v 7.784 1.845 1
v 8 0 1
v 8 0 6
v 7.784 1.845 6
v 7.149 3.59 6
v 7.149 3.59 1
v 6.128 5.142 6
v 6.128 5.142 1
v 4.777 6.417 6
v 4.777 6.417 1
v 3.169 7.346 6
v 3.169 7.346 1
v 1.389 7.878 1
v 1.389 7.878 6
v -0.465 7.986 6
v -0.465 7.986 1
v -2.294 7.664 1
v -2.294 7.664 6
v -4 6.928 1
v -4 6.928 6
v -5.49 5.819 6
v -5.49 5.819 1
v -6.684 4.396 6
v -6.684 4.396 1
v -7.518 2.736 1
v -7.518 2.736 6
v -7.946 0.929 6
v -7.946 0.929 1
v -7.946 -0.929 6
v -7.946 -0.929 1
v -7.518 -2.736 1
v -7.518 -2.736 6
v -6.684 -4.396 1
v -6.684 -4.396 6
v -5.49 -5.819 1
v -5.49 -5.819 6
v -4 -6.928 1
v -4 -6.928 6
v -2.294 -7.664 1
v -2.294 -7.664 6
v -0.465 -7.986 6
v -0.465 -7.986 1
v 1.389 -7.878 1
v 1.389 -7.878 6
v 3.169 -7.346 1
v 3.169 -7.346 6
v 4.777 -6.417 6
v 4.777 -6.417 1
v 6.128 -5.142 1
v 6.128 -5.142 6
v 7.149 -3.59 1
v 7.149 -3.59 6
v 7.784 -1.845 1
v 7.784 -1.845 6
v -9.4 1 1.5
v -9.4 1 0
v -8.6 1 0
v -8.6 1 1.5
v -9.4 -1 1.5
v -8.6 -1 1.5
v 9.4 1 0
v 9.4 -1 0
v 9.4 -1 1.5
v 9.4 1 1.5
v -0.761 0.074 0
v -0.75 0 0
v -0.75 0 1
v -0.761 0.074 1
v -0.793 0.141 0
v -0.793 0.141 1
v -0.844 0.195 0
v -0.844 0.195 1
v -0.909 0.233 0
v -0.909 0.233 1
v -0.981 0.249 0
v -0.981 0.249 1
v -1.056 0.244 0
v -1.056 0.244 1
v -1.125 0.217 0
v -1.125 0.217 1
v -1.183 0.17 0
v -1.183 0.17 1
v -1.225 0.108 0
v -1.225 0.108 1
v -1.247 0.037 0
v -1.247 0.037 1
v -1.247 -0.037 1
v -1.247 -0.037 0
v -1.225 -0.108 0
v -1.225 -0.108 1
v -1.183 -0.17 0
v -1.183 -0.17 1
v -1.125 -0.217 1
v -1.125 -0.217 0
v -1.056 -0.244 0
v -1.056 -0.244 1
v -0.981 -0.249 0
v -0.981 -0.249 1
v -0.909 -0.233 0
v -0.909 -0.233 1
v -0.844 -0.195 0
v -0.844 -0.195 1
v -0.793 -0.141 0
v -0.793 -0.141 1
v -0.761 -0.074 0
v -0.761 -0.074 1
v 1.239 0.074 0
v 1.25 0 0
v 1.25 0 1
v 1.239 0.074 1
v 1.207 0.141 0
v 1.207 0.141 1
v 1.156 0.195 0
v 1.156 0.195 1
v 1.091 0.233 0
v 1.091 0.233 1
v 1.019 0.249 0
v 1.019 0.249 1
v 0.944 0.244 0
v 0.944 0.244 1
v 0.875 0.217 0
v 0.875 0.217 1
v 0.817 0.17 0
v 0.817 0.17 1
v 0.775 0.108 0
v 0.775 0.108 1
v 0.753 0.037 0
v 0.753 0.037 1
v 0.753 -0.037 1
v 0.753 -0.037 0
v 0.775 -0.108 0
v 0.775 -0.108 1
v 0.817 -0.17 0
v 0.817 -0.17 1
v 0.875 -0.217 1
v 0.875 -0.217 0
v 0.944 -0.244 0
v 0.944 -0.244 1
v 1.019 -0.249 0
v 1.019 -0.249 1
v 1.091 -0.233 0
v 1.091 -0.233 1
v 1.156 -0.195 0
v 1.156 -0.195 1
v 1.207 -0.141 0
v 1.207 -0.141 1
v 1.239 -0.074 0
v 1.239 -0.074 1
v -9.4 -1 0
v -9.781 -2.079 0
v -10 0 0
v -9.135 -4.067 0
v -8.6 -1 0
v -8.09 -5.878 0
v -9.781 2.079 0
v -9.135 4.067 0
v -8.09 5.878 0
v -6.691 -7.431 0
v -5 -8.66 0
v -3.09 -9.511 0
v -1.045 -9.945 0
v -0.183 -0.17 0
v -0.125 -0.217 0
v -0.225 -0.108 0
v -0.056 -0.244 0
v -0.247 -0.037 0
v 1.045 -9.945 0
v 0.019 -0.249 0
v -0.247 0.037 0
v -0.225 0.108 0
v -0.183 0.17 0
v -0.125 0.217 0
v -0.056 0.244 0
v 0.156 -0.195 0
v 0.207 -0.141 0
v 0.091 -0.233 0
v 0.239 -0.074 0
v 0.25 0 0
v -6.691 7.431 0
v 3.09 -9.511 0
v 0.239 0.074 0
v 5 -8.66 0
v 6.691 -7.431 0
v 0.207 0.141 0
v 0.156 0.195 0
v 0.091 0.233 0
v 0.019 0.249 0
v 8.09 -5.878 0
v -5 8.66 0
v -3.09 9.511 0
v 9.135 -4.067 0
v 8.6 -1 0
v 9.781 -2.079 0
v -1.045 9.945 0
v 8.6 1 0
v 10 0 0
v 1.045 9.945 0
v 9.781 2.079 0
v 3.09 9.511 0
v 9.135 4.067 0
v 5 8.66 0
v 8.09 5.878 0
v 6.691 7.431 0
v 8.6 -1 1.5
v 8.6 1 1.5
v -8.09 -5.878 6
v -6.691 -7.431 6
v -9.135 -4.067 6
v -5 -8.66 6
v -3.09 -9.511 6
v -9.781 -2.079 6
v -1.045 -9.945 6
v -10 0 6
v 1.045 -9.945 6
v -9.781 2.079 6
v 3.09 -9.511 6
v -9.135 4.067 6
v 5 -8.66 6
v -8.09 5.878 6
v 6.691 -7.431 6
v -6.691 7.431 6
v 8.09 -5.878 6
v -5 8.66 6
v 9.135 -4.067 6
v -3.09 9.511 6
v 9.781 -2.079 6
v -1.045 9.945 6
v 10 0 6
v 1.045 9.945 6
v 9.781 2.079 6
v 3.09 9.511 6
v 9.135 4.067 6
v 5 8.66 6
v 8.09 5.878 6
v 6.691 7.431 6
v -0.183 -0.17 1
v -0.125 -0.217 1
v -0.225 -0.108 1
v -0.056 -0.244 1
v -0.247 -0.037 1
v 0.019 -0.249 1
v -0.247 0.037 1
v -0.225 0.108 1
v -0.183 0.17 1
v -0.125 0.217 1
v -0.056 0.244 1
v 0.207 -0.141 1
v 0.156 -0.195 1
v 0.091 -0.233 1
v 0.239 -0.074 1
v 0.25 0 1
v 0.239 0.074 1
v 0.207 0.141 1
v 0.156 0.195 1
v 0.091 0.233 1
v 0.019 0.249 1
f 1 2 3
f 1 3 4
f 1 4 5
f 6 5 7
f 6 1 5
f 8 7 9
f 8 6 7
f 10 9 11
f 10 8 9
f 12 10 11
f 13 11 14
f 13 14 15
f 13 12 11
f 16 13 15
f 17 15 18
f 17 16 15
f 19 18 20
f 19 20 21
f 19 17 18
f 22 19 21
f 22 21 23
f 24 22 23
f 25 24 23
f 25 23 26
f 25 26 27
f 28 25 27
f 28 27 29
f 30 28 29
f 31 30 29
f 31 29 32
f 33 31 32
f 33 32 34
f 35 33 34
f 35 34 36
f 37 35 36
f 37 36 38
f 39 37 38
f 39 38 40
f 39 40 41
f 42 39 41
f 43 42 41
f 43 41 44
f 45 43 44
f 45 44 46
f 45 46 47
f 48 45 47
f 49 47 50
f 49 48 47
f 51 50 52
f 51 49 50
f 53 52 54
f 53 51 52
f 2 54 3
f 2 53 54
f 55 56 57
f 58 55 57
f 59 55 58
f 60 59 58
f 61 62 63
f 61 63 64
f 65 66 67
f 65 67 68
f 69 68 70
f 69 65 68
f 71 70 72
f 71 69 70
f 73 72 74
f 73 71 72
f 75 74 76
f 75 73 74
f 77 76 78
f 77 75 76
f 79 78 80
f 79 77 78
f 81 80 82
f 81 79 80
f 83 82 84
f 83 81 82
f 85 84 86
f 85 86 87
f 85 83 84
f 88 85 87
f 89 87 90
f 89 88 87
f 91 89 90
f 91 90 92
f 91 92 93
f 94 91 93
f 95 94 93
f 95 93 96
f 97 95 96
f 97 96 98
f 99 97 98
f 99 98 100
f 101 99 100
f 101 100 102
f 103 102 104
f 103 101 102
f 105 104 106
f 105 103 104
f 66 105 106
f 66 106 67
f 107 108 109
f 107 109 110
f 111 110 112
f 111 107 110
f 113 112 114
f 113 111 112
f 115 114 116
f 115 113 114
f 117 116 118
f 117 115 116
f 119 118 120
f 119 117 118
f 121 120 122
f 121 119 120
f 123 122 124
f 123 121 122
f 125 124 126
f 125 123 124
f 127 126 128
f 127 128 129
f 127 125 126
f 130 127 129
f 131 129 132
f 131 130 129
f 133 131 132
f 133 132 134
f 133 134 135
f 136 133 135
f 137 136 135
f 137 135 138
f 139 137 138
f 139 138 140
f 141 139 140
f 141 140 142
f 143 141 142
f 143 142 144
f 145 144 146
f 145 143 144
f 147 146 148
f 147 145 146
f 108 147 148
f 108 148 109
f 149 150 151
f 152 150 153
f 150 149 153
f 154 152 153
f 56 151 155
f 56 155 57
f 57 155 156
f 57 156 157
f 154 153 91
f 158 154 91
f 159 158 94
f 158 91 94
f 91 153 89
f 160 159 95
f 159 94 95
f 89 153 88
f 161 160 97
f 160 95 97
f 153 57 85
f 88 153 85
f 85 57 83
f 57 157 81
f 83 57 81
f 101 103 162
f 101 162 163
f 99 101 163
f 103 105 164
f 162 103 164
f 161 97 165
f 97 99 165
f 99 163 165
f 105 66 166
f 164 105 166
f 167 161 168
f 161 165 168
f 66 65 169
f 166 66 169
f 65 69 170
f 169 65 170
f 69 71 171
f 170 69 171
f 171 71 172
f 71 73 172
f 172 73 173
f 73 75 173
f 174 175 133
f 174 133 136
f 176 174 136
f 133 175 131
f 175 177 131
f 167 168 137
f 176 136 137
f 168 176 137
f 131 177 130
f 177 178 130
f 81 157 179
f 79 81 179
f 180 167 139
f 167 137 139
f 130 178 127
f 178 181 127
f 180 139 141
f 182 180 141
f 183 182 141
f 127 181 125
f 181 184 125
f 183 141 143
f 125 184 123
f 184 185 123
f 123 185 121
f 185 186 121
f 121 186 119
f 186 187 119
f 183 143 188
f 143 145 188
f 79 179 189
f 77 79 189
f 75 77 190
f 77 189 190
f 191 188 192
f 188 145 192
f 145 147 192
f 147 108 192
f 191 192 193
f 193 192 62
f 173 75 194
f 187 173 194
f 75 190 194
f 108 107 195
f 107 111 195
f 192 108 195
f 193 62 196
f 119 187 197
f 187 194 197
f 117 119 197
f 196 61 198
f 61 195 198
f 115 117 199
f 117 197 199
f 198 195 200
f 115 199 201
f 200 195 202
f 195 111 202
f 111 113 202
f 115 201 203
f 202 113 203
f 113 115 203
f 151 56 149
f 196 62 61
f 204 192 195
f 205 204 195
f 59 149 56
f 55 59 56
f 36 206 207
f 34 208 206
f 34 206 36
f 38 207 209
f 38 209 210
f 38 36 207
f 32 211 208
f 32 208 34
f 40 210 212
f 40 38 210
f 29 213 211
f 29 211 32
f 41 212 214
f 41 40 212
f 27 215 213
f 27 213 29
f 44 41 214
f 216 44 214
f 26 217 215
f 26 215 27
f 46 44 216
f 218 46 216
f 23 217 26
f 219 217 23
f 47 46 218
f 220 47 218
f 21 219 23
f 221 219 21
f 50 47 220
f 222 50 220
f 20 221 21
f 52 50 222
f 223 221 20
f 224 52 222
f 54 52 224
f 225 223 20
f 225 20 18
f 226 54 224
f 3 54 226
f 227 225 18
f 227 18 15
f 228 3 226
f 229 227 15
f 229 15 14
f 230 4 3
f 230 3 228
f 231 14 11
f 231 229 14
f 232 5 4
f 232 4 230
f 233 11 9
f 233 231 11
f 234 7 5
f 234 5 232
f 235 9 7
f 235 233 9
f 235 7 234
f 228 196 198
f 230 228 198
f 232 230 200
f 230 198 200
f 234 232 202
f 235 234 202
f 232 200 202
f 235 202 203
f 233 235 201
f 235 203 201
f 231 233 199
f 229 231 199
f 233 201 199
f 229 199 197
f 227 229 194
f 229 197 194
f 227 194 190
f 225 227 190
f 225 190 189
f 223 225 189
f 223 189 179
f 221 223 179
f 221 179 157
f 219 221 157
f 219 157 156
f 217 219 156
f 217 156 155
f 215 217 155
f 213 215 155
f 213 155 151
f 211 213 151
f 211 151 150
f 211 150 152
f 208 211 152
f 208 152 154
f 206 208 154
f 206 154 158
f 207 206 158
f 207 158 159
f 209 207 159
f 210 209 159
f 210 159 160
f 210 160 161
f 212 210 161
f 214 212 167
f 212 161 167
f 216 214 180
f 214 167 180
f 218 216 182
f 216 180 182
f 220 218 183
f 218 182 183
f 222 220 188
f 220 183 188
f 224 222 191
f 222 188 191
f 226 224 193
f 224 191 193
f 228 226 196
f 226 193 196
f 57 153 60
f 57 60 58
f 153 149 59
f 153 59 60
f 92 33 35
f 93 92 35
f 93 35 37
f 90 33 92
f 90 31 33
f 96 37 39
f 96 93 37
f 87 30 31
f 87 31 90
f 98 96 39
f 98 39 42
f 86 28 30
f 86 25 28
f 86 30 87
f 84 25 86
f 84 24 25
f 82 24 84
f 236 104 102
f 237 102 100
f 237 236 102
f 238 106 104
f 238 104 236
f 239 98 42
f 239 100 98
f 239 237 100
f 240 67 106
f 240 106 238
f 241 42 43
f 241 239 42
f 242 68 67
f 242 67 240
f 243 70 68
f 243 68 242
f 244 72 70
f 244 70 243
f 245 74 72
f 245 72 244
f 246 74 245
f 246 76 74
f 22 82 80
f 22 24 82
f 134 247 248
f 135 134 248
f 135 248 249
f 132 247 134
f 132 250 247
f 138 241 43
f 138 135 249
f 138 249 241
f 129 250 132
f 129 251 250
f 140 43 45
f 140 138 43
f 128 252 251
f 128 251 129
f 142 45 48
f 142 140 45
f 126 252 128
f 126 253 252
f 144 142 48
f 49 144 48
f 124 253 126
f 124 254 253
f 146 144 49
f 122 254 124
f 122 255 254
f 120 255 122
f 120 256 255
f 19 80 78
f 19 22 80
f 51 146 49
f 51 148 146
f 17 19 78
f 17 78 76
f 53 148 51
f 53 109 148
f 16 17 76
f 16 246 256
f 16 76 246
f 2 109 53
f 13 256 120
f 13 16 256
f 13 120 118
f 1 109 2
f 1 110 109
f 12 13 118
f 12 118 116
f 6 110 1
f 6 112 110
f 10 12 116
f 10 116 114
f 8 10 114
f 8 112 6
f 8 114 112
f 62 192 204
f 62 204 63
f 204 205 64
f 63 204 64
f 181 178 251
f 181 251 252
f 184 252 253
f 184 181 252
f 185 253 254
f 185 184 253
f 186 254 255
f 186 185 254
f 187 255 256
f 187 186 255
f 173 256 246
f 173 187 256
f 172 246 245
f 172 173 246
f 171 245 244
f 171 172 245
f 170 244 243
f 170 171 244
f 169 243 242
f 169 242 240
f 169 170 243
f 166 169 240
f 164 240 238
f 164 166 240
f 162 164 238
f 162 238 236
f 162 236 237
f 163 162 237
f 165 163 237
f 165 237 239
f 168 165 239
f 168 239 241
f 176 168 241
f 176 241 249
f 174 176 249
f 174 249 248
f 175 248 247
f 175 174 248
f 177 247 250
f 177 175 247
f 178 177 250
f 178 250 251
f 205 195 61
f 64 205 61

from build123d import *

# Parameters (mm, degrees)
F0_R     = 10
F0_R_2   = 8
F1_DEPTH = 6
F2_R     = 10
F2_W     = 0.8
F2_H     = 2
F2_R_2   = 0.25
F3_DEPTH = 1
F4_DEPTH = 1.5


with BuildPart() as f1:
    # F0 (on Top) → F1 (new body)
    with BuildSketch(Plane.XY):
        Circle(F0_R)
        Circle(F0_R_2, mode=Mode.SUBTRACT)
    extrude(amount=F1_DEPTH)

    # F2 (on Top) → F3 (join)
    with BuildSketch(Plane.XY):
        Circle(F2_R)
        with Locations((-9, 0)):
            Rectangle(F2_W, F2_H, mode=Mode.SUBTRACT)
        with Locations((-1, 0)):
            Circle(F2_R_2, mode=Mode.SUBTRACT)
        Circle(F2_R_2, mode=Mode.SUBTRACT)
        with Locations((1, 0)):
            Circle(F2_R_2, mode=Mode.SUBTRACT)
        with Locations((9, 0)):
            Rectangle(F2_W, F2_H, mode=Mode.SUBTRACT)
    extrude(amount=F3_DEPTH)

    # F2 (on Top) → F4 (cut)
    with BuildSketch(Plane.XY):
        with Locations((9, 0)):
            Rectangle(F2_W, F2_H)
        with Locations((-9, 0)):
            Rectangle(F2_W, F2_H)
    extrude(amount=F4_DEPTH, mode=Mode.SUBTRACT)


solid = f1.part
